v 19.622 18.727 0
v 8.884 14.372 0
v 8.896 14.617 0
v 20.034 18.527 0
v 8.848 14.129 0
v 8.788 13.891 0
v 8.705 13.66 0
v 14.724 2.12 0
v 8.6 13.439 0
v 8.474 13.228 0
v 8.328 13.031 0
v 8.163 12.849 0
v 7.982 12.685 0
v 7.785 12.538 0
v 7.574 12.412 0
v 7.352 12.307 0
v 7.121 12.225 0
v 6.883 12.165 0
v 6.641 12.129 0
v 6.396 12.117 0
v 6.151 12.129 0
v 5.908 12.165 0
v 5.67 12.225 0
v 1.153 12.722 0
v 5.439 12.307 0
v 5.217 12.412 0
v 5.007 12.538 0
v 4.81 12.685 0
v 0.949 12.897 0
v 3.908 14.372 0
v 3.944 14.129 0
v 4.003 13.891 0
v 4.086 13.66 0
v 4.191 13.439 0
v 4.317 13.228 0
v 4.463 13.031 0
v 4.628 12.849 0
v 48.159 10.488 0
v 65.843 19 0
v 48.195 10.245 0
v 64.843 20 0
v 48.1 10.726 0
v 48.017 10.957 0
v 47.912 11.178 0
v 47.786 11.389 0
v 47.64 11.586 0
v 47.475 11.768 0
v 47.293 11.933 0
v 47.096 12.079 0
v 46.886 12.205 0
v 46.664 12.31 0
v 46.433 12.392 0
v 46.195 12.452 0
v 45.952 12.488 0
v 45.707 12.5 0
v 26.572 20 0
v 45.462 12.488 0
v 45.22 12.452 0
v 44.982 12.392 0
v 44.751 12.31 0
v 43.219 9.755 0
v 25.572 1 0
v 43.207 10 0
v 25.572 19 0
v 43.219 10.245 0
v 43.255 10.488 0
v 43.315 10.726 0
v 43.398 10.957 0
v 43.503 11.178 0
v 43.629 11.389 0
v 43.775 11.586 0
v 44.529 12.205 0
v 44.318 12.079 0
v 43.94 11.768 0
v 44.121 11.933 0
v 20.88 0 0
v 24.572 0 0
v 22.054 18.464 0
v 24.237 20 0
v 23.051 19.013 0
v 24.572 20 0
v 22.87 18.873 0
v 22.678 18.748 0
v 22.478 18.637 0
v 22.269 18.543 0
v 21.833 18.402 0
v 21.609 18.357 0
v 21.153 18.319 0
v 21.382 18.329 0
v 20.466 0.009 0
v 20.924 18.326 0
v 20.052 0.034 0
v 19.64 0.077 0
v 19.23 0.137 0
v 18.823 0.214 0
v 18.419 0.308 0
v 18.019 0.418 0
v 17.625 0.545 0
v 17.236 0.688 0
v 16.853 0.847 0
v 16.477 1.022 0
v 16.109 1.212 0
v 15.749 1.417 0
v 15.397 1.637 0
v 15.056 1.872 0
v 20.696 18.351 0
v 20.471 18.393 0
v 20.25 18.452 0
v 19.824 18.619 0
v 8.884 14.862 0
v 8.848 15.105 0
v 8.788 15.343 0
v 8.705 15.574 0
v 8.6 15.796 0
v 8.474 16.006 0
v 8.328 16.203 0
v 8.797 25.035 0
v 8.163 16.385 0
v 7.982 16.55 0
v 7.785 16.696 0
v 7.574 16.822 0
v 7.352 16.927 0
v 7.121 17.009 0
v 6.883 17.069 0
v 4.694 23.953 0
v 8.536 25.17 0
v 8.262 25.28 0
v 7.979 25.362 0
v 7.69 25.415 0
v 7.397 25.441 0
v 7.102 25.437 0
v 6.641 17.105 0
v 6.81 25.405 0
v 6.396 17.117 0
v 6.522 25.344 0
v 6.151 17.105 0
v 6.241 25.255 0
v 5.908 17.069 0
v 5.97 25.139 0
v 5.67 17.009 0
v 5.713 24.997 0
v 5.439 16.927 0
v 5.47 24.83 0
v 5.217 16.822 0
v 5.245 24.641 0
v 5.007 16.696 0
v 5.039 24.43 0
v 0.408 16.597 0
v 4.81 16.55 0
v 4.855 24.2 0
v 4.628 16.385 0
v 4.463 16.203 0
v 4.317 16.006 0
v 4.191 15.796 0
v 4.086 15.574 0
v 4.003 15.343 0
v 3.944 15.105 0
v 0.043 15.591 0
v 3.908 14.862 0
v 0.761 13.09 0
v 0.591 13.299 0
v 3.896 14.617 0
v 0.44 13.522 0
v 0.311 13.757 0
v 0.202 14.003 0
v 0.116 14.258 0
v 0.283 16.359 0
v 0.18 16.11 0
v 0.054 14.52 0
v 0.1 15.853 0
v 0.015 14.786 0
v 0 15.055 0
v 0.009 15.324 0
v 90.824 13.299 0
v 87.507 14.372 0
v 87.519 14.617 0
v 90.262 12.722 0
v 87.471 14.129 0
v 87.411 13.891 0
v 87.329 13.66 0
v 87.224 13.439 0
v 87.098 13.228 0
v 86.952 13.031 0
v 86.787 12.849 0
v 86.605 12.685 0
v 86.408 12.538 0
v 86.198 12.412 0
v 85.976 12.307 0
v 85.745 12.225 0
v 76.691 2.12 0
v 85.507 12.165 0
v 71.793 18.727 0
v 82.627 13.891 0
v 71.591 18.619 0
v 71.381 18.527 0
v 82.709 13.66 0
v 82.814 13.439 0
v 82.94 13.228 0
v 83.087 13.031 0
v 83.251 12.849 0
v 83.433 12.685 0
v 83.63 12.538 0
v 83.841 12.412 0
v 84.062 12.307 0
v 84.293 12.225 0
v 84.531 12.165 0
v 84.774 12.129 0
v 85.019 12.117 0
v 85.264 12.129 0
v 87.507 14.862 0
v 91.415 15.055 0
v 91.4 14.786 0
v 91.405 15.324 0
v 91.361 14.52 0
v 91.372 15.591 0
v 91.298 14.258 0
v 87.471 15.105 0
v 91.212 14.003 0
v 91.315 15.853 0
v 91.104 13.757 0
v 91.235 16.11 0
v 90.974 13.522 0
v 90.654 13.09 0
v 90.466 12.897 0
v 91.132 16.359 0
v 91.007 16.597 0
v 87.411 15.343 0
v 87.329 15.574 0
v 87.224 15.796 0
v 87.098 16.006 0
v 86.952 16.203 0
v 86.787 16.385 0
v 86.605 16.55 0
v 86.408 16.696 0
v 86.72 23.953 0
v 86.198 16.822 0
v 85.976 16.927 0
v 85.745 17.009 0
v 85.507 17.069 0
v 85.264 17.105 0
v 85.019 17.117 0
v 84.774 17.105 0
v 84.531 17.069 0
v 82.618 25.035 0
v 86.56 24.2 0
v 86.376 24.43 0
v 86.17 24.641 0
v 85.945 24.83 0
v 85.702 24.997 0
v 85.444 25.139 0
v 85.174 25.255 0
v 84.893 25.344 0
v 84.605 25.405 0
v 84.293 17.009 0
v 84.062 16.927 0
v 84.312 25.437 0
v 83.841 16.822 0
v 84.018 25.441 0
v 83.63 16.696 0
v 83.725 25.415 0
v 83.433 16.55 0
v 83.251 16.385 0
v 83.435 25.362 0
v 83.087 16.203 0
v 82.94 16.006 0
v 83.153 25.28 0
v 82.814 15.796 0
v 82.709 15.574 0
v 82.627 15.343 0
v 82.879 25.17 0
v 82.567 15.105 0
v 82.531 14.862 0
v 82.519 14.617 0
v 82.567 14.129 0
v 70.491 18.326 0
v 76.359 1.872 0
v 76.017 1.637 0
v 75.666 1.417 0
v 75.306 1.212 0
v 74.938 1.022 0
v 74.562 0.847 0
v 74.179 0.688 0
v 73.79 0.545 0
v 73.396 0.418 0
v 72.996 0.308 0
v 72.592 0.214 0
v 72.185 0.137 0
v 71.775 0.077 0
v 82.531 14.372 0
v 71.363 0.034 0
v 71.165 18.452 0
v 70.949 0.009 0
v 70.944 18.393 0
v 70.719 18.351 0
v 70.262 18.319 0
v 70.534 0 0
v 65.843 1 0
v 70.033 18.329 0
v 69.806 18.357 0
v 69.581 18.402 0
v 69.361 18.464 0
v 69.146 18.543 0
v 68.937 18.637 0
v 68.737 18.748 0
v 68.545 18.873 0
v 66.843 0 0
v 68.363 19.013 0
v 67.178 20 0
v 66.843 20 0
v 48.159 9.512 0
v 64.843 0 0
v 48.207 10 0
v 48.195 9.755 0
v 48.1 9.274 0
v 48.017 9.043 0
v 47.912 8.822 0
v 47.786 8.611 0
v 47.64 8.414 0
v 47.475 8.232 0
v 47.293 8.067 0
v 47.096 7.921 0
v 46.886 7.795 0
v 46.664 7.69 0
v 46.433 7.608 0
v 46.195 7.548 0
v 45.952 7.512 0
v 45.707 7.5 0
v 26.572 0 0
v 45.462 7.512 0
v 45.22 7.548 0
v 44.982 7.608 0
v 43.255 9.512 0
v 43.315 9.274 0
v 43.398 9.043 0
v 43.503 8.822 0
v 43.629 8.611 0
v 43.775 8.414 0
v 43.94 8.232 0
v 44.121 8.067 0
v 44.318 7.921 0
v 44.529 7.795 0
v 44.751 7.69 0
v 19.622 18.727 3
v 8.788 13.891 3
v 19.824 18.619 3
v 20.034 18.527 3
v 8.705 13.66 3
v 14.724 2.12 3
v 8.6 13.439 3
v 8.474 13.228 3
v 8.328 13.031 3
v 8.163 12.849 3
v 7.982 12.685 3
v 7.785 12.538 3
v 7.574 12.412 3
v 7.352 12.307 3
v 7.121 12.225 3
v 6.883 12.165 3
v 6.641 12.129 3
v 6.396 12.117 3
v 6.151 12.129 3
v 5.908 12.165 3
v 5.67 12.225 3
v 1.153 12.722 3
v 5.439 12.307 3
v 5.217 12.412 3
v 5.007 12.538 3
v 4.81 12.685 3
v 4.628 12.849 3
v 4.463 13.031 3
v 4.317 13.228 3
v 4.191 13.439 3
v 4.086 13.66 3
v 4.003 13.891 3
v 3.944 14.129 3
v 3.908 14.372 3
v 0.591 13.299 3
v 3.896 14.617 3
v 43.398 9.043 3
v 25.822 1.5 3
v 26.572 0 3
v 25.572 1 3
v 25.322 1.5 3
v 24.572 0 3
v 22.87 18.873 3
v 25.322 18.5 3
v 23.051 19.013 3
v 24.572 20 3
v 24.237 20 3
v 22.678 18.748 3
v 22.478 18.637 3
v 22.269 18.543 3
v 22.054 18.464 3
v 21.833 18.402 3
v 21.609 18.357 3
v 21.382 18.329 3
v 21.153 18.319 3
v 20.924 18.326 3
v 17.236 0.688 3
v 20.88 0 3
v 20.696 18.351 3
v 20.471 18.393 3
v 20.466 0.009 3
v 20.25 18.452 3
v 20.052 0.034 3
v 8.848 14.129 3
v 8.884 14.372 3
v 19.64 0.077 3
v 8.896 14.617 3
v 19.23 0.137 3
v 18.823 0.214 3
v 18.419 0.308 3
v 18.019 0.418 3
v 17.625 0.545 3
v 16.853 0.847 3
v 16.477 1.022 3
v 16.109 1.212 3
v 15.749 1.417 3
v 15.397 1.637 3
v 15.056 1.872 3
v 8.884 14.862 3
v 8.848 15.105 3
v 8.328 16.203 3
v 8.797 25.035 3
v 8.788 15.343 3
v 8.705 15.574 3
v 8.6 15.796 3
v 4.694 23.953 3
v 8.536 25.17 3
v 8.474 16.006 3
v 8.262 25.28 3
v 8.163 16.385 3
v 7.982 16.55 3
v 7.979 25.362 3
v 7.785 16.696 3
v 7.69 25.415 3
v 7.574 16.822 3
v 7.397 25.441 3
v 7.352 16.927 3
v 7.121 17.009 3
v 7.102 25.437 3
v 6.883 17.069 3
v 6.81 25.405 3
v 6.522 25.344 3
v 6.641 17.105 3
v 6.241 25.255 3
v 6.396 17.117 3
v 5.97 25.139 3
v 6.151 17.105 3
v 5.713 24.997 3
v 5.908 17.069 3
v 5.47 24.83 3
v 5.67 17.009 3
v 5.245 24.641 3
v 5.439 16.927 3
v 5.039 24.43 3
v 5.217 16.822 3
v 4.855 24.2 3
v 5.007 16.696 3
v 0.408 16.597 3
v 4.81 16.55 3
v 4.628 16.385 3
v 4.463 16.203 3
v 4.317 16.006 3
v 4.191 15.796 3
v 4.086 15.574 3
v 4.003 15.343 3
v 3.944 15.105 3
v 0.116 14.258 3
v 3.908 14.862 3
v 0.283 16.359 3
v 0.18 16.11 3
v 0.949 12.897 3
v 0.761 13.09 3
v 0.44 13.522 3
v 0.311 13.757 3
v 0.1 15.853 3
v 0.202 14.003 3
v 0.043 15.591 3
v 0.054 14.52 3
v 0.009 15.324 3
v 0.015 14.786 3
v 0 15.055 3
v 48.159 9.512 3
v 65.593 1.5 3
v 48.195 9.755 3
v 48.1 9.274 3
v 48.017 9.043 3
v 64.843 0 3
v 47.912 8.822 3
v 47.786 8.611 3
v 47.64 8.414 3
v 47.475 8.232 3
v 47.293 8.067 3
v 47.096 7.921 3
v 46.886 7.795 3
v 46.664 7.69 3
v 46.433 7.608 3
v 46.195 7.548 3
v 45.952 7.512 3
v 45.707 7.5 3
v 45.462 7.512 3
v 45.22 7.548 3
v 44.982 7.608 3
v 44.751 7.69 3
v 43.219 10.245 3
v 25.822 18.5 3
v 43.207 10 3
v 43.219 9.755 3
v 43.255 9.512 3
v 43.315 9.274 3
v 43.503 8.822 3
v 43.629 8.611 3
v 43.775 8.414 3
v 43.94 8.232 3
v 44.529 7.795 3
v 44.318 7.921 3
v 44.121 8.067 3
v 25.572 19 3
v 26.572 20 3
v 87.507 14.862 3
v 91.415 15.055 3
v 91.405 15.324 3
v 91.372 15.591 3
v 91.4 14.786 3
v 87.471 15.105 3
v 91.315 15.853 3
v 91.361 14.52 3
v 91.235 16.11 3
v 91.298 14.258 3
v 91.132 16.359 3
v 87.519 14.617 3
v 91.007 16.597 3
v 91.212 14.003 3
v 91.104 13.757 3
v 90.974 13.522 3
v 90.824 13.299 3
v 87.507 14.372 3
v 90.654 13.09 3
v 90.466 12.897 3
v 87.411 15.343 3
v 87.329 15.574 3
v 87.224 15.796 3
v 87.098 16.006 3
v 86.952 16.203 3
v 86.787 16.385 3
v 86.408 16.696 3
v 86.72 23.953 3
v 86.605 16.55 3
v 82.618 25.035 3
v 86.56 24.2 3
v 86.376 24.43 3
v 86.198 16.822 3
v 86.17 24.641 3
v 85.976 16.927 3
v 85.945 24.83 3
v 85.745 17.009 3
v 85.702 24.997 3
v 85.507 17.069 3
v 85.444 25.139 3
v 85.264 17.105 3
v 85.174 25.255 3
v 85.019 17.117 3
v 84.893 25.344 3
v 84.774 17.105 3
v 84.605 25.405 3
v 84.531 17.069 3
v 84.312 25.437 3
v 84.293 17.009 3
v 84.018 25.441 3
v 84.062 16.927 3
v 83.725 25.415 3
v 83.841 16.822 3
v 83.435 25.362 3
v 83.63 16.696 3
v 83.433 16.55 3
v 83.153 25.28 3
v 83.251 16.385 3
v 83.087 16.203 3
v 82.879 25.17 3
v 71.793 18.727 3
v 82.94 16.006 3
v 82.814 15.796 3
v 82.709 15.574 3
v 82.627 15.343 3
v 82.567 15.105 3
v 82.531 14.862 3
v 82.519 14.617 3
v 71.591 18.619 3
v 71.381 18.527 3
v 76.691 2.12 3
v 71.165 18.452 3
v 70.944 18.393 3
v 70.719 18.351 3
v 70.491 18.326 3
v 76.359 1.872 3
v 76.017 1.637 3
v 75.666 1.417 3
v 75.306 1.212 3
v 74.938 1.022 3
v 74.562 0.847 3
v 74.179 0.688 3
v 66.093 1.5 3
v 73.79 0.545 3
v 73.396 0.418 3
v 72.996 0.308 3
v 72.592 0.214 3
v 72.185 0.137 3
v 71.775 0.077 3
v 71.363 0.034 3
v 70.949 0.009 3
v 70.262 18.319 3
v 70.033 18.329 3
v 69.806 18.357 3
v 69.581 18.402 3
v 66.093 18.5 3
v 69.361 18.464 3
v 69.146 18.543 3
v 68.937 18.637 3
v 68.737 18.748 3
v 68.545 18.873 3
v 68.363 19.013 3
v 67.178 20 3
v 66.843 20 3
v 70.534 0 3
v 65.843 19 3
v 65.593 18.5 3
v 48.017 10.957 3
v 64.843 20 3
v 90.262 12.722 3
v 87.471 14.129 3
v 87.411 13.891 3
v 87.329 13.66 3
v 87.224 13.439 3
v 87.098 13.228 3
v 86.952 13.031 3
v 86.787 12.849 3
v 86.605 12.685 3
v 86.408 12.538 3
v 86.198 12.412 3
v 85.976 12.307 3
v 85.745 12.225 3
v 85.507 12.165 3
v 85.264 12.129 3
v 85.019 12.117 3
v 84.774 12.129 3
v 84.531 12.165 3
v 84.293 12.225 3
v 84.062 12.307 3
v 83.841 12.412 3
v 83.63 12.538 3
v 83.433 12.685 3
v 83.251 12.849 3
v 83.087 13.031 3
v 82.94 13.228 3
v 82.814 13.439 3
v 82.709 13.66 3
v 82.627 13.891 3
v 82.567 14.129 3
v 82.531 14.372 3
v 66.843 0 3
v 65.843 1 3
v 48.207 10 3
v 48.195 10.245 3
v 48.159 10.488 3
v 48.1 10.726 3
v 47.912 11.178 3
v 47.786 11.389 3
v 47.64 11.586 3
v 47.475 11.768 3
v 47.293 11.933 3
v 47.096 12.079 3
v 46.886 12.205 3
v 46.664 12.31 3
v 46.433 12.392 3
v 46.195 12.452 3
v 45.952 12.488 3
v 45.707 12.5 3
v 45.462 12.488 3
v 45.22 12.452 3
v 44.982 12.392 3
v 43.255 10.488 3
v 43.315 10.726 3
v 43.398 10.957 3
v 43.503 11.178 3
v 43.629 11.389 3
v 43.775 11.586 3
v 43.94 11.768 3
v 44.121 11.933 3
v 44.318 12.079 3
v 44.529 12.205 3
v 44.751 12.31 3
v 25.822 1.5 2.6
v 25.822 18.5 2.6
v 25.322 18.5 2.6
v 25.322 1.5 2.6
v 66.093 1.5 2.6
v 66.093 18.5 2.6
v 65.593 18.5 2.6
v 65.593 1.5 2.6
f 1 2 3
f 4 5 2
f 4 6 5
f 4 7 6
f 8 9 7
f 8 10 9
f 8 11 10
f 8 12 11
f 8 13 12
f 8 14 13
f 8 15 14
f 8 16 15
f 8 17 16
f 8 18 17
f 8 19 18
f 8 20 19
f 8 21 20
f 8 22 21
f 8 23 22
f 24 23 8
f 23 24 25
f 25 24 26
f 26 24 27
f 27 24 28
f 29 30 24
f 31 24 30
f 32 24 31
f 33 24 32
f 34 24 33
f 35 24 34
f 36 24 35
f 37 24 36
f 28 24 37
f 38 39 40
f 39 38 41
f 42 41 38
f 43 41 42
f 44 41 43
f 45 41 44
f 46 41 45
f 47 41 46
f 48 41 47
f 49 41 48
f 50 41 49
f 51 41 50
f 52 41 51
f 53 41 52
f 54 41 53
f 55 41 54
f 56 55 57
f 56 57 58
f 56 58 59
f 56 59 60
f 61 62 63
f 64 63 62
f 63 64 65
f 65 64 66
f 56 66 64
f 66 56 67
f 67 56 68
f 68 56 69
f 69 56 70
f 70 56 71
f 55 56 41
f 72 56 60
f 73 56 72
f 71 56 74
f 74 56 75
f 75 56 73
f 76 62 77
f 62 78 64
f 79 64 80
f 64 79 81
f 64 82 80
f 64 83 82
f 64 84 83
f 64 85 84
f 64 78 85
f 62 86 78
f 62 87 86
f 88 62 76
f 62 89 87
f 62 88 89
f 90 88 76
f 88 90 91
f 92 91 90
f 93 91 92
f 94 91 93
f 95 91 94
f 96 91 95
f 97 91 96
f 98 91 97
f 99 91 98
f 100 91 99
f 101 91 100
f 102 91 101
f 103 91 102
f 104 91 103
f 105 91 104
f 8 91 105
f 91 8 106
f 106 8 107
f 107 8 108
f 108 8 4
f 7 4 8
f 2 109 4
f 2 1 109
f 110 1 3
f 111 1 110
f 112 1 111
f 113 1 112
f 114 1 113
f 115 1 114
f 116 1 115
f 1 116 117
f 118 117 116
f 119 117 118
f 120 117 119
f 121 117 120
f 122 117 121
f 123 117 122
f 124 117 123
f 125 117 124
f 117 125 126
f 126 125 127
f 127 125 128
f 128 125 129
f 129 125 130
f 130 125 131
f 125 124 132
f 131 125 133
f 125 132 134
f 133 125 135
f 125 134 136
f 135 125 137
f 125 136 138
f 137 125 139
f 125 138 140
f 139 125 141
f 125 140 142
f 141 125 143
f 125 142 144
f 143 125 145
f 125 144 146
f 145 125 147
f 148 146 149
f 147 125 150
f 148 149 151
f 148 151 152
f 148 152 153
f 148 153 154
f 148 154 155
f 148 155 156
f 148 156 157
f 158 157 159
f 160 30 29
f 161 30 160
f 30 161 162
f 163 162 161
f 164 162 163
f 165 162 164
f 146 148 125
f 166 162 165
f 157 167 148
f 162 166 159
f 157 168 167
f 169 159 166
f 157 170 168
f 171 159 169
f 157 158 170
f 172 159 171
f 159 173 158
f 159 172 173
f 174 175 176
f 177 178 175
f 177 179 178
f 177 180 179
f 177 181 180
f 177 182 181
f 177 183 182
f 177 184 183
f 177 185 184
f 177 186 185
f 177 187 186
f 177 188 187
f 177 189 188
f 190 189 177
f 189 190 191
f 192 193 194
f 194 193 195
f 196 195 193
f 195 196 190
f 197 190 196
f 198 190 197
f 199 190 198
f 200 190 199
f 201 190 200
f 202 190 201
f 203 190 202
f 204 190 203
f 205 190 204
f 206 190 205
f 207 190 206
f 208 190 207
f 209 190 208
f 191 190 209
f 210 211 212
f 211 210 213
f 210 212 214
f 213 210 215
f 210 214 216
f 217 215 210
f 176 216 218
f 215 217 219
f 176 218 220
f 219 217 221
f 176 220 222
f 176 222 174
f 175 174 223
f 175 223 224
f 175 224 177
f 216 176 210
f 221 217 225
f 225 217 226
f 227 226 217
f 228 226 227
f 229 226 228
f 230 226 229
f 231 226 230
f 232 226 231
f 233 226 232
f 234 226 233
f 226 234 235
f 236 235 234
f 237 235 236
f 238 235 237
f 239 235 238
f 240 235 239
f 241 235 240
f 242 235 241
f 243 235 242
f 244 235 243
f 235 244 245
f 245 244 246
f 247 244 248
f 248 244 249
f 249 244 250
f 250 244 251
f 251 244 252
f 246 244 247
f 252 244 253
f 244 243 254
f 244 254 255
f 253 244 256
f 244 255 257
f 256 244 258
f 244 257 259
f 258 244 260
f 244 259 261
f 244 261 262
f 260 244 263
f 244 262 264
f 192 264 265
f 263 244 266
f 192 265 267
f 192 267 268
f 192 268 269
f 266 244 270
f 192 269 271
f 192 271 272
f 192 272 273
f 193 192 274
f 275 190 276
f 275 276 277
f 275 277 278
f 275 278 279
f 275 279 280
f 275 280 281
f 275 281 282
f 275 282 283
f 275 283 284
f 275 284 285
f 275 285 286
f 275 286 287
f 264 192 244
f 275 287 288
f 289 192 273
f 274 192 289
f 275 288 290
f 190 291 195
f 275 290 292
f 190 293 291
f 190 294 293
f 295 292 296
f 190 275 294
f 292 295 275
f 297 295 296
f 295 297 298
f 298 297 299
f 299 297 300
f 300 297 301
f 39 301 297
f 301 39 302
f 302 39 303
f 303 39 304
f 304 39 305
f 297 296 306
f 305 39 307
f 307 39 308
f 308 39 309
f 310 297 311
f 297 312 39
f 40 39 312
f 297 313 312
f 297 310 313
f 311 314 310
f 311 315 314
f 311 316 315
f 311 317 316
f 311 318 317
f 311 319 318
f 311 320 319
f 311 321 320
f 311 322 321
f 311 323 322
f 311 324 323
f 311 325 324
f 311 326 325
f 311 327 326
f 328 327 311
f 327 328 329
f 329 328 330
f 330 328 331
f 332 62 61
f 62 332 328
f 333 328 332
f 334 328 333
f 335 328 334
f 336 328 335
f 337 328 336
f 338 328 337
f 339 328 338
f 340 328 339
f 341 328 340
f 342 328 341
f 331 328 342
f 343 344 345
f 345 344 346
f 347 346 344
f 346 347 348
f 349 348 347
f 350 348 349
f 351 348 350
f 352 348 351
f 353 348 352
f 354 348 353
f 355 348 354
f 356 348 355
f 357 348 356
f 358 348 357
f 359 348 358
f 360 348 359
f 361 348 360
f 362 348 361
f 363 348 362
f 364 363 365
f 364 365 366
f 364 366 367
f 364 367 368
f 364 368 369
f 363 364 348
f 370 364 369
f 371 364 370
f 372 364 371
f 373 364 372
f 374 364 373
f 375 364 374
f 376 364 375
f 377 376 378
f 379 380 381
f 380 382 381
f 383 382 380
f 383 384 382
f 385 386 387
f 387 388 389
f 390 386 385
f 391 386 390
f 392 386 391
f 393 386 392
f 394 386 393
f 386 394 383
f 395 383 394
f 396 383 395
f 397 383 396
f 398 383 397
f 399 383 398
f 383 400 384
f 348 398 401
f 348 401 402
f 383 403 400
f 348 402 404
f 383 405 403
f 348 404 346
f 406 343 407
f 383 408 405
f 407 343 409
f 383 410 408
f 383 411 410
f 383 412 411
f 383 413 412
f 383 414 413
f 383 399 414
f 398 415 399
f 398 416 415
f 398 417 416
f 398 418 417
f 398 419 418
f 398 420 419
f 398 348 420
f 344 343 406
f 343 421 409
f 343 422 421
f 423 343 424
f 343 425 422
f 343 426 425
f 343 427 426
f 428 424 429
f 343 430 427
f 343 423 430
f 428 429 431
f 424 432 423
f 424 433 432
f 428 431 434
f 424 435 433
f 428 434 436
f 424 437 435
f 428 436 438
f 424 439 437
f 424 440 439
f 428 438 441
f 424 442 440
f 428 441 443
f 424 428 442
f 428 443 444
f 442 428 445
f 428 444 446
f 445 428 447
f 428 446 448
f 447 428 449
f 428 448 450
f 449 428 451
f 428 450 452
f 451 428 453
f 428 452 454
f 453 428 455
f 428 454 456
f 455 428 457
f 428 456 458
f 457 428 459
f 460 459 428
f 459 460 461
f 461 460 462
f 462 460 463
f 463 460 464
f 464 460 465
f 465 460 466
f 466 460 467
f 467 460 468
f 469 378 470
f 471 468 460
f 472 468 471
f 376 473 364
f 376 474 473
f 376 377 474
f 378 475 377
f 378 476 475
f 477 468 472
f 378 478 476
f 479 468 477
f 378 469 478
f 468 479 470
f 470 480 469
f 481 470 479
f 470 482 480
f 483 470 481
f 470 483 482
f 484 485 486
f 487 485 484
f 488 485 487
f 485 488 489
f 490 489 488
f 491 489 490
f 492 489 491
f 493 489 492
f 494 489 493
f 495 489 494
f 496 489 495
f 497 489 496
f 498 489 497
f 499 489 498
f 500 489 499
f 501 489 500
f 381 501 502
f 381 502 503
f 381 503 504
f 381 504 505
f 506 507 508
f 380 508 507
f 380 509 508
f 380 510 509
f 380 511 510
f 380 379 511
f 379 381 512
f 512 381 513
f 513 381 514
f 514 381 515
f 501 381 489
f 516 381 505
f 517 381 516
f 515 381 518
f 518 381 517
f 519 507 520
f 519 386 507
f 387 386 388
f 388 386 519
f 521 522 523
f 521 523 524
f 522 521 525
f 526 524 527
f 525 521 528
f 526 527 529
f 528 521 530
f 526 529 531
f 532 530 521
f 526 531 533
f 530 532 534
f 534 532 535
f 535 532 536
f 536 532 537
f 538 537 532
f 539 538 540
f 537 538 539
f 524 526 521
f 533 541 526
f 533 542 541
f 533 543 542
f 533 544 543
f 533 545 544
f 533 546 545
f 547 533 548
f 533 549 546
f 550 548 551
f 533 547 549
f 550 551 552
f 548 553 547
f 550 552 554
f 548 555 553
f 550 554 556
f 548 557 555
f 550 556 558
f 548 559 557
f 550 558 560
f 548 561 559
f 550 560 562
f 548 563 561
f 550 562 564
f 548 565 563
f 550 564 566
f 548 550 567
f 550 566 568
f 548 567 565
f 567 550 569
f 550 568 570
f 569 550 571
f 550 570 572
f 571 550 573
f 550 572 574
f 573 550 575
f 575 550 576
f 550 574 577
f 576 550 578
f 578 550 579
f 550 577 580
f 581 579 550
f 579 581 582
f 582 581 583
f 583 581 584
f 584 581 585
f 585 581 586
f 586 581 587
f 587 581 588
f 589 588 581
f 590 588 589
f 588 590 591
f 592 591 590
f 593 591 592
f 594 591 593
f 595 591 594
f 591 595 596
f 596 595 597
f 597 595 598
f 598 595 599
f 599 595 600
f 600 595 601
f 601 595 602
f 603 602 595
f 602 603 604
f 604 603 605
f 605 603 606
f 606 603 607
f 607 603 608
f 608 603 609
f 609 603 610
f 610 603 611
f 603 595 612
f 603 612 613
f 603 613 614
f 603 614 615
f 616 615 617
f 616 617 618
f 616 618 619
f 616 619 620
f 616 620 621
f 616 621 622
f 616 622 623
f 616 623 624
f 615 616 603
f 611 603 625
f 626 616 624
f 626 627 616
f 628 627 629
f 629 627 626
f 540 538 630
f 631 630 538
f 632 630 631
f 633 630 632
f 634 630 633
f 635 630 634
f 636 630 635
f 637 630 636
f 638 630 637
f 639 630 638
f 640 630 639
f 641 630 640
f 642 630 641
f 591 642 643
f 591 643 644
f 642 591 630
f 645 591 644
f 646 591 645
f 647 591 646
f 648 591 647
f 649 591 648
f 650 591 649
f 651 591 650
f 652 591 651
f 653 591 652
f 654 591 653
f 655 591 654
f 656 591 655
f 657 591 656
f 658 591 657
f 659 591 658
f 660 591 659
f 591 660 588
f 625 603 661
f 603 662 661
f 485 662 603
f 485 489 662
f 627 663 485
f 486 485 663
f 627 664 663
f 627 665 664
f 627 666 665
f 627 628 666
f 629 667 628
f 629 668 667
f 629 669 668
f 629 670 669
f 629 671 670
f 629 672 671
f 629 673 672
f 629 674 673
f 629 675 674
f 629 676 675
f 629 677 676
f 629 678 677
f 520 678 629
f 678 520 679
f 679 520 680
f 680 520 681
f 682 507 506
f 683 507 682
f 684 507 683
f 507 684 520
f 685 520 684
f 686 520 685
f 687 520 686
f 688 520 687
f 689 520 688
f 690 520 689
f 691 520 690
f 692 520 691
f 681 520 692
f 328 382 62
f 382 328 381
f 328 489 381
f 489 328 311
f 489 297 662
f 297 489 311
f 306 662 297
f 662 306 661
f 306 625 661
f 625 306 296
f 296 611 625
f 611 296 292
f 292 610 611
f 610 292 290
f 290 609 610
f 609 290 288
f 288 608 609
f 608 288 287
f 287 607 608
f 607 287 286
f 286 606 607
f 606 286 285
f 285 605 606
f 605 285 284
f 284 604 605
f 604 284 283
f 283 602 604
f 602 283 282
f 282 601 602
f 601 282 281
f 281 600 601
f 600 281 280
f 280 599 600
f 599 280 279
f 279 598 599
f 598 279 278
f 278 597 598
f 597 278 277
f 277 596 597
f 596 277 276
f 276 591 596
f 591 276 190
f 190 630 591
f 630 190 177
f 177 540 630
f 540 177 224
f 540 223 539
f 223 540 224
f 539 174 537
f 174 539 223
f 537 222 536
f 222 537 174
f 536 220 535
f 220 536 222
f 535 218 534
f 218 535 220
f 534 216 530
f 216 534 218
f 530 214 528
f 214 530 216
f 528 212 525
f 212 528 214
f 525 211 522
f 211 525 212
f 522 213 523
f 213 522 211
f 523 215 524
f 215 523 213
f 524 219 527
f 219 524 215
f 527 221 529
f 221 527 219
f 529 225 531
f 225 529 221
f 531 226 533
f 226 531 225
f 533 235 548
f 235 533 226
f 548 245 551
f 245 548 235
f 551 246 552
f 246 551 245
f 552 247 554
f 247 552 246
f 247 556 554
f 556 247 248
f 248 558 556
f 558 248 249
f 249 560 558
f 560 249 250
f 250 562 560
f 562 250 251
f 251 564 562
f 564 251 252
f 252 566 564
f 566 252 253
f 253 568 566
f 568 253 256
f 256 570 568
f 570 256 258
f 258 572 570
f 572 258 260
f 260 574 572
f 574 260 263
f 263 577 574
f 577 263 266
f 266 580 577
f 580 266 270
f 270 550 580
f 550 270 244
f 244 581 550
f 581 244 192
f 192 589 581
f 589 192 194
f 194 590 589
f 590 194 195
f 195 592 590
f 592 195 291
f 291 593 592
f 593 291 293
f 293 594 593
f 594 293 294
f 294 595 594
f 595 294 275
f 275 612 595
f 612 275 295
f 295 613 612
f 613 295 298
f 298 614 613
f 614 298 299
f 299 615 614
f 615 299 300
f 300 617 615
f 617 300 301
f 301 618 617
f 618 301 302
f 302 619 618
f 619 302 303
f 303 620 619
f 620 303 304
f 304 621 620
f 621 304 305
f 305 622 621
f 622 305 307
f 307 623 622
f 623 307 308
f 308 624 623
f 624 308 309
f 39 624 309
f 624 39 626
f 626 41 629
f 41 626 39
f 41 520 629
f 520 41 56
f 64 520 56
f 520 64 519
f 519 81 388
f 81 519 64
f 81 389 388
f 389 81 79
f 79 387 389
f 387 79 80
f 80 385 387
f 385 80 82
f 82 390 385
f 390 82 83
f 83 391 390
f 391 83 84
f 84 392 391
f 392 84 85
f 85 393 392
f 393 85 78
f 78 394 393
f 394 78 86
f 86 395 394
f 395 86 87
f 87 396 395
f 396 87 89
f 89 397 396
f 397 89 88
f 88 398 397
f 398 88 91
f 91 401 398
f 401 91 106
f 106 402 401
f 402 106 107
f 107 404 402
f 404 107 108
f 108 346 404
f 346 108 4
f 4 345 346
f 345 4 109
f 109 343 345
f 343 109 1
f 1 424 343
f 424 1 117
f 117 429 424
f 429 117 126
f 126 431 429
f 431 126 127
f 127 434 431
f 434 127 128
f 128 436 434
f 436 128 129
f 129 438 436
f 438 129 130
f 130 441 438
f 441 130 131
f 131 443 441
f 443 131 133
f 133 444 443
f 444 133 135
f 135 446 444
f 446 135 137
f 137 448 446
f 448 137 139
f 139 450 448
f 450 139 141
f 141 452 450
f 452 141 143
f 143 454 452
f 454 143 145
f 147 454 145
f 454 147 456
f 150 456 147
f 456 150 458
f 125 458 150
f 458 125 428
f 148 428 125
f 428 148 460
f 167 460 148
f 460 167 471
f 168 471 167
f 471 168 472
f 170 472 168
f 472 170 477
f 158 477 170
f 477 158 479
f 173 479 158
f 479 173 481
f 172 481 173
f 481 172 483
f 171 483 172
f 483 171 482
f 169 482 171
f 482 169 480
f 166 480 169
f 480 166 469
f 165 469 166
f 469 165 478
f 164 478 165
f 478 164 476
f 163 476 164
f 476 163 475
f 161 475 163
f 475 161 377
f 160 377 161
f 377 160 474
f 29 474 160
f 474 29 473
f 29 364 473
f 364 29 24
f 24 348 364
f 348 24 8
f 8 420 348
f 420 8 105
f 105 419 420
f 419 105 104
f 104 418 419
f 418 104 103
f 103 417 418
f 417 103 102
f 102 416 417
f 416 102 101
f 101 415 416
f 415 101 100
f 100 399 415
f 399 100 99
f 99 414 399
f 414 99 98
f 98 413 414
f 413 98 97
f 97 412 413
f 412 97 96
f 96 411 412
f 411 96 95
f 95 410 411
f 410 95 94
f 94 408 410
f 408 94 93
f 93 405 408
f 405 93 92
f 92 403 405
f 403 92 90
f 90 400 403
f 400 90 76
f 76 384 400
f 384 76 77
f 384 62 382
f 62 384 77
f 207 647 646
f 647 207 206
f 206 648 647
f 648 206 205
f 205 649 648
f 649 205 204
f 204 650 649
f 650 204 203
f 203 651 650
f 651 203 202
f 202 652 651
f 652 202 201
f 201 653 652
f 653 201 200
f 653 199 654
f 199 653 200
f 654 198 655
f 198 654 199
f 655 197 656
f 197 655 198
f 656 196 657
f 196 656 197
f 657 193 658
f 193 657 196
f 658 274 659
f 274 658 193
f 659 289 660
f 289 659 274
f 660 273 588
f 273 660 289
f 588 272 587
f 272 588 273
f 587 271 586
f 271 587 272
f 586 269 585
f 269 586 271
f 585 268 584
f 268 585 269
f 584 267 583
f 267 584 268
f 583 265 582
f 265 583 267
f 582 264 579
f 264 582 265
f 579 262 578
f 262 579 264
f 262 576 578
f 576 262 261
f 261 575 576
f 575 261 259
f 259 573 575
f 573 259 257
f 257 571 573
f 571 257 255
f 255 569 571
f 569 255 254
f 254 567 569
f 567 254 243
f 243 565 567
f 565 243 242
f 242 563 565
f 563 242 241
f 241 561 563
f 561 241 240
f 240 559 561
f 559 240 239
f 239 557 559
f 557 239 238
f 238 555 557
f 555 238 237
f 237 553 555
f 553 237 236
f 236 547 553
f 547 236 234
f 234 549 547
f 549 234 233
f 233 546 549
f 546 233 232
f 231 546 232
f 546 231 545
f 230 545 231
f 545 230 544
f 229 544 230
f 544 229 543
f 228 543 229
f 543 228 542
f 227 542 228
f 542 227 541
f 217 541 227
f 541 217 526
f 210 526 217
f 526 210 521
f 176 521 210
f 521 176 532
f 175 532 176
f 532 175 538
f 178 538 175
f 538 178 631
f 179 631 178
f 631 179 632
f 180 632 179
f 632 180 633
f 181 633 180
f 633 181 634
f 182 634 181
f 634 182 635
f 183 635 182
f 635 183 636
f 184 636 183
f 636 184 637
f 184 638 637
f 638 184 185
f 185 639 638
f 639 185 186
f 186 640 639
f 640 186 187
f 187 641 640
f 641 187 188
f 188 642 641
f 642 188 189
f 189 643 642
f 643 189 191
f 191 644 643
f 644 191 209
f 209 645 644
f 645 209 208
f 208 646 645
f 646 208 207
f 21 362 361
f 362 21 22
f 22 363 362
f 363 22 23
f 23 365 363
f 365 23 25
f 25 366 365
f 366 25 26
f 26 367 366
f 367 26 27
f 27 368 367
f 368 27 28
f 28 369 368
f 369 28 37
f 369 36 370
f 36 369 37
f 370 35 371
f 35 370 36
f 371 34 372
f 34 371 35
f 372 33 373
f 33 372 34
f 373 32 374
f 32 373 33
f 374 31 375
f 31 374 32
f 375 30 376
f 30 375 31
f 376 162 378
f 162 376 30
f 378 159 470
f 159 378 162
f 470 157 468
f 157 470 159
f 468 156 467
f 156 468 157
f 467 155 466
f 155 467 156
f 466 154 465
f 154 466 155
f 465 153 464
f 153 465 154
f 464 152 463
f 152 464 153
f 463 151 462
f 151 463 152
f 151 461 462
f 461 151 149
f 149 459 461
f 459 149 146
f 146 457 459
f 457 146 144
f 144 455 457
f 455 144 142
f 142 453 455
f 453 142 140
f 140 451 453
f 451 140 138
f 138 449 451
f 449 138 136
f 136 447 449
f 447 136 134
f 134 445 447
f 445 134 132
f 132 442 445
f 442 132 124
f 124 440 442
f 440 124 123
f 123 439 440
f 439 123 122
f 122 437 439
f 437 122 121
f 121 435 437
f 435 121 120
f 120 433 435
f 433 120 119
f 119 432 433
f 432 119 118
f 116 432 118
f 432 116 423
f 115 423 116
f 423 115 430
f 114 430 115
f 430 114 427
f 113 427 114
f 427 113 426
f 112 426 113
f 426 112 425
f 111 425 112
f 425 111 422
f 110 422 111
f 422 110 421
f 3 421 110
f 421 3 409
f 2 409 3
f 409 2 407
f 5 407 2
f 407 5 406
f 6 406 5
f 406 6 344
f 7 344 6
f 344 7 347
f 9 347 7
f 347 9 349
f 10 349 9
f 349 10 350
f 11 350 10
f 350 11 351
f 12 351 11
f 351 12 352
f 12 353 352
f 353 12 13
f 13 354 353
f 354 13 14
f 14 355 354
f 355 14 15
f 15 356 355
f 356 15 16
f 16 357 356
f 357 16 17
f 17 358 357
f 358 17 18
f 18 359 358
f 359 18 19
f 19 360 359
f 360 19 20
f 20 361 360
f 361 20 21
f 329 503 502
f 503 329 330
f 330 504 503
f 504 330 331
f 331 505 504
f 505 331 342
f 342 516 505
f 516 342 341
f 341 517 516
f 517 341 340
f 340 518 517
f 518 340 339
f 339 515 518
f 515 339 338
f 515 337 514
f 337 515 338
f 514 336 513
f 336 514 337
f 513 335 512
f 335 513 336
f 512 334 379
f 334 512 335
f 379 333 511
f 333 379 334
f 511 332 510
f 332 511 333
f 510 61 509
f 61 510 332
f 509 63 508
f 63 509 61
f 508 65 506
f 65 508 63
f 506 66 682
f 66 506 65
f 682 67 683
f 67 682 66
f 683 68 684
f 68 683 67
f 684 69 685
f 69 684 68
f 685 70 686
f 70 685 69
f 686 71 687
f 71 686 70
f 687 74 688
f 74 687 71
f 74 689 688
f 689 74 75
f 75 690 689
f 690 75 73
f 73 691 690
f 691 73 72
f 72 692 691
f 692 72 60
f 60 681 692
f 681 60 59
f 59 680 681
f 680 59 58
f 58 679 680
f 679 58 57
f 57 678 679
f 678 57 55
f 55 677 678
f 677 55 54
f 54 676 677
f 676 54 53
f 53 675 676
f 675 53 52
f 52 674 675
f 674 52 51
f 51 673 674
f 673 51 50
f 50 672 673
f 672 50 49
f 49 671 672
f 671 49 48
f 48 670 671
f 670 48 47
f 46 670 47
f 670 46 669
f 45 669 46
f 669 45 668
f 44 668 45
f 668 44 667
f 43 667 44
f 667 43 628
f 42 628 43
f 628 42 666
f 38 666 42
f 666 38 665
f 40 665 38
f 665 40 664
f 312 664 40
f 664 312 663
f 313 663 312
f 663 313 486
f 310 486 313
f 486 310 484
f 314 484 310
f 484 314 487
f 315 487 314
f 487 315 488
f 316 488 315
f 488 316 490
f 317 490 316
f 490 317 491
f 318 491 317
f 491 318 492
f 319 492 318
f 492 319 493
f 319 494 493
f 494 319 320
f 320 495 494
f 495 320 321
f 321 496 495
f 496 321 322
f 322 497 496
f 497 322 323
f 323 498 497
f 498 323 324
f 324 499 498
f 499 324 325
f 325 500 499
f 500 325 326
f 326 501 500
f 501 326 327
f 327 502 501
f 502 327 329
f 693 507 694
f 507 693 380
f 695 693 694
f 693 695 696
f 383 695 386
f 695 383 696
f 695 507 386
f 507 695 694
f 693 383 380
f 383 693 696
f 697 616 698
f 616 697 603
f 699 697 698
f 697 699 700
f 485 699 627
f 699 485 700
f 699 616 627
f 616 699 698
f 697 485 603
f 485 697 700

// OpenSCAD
// Metal Components/Steel Parts/3mm Angled Load Cell Bracket x1.scad
// Thickness: 3mm

$fn = 64; 

// Helper function to generate points along an arc
function make_arc(x, y, r, a1, a2, steps=16) =
    [for (i=[0:steps]) [
        x + r*cos(a1 + (a2-a1)*i/steps),
        y + r*sin(a1 + (a2-a1)*i/steps)
    ]];

module 3mm_Angled_Load_Cell_Bracket() {
    
    // Trace outer perimeter CCW combining straight line coordinates and mathematical arcs
    pts = concat(
        // Bottom Edge right-to-left
        [[20.8803, 0], [24.5722, 0]],
        [[25.5722, 1], [26.5722, 0]], // Relief cut
        [[64.8426, 0]],
        [[65.8426, 1], [66.8426, 0]], // Relief cut
        [[70.5345, 0]],
        
        // Right Side Complex
        make_arc(70.5345, 10.0, 10.0, 270.0, 308.0),
        make_arc(88.4148, 15.0865, 3.0, 308.0, 390.23), // 30.23 + 360 mapped
        make_arc(84.1283, 22.4427, 3.0, 30.23, 120.23),
        make_arc(70.2826, 21.3189, 3.0, 300.23, 230.23), // Reverse sweep
        
        // Top Edge left-to-right
        [[67.1778, 20.0], [66.8426, 20.0]],
        [[65.8426, 19.0], [64.8426, 20.0]], // Relief cut
        [[26.5722, 20.0]],
        [[25.5722, 19.0], [24.5722, 20.0]], // Relief cut
        [[24.2370, 20.0], [23.0513, 19.0131]],
        
        // Left Side Complex
        make_arc(21.1322, 21.3189, 3.0, 309.769, 239.769), // Reverse sweep
        make_arc(7.2865, 22.4427, 3.0, 59.769, 149.769),
        make_arc(2.9999, 15.0865, 3.0, 149.769, 232.0),
        make_arc(20.8803, 10.0, 10.0, 232.0, 270.0)
    );

    difference() {
        // Base plate extrusion
        linear_extrude(height = 3) {
            difference() {
                polygon(pts);
                
                // Mounting and clearance holes (Radius 2.5)
                translate([85.0191, 14.6171]) circle(r = 2.5);
                translate([6.3957, 14.6171]) circle(r = 2.5);
                translate([45.7074, 10.0]) circle(r = 2.5);
            }
        }
        
        // Visual fold scoring marks (subtracted 0.2mm into the top surface)
        translate([25.5722, 10, 3 - 0.2])
            cube([0.5, 17, 0.4], center=true);
        translate([65.8426, 10, 3 - 0.2])
            cube([0.5, 17, 0.4], center=true);
    }
}

// Render the part
3mm_Angled_Load_Cell_Bracket();
